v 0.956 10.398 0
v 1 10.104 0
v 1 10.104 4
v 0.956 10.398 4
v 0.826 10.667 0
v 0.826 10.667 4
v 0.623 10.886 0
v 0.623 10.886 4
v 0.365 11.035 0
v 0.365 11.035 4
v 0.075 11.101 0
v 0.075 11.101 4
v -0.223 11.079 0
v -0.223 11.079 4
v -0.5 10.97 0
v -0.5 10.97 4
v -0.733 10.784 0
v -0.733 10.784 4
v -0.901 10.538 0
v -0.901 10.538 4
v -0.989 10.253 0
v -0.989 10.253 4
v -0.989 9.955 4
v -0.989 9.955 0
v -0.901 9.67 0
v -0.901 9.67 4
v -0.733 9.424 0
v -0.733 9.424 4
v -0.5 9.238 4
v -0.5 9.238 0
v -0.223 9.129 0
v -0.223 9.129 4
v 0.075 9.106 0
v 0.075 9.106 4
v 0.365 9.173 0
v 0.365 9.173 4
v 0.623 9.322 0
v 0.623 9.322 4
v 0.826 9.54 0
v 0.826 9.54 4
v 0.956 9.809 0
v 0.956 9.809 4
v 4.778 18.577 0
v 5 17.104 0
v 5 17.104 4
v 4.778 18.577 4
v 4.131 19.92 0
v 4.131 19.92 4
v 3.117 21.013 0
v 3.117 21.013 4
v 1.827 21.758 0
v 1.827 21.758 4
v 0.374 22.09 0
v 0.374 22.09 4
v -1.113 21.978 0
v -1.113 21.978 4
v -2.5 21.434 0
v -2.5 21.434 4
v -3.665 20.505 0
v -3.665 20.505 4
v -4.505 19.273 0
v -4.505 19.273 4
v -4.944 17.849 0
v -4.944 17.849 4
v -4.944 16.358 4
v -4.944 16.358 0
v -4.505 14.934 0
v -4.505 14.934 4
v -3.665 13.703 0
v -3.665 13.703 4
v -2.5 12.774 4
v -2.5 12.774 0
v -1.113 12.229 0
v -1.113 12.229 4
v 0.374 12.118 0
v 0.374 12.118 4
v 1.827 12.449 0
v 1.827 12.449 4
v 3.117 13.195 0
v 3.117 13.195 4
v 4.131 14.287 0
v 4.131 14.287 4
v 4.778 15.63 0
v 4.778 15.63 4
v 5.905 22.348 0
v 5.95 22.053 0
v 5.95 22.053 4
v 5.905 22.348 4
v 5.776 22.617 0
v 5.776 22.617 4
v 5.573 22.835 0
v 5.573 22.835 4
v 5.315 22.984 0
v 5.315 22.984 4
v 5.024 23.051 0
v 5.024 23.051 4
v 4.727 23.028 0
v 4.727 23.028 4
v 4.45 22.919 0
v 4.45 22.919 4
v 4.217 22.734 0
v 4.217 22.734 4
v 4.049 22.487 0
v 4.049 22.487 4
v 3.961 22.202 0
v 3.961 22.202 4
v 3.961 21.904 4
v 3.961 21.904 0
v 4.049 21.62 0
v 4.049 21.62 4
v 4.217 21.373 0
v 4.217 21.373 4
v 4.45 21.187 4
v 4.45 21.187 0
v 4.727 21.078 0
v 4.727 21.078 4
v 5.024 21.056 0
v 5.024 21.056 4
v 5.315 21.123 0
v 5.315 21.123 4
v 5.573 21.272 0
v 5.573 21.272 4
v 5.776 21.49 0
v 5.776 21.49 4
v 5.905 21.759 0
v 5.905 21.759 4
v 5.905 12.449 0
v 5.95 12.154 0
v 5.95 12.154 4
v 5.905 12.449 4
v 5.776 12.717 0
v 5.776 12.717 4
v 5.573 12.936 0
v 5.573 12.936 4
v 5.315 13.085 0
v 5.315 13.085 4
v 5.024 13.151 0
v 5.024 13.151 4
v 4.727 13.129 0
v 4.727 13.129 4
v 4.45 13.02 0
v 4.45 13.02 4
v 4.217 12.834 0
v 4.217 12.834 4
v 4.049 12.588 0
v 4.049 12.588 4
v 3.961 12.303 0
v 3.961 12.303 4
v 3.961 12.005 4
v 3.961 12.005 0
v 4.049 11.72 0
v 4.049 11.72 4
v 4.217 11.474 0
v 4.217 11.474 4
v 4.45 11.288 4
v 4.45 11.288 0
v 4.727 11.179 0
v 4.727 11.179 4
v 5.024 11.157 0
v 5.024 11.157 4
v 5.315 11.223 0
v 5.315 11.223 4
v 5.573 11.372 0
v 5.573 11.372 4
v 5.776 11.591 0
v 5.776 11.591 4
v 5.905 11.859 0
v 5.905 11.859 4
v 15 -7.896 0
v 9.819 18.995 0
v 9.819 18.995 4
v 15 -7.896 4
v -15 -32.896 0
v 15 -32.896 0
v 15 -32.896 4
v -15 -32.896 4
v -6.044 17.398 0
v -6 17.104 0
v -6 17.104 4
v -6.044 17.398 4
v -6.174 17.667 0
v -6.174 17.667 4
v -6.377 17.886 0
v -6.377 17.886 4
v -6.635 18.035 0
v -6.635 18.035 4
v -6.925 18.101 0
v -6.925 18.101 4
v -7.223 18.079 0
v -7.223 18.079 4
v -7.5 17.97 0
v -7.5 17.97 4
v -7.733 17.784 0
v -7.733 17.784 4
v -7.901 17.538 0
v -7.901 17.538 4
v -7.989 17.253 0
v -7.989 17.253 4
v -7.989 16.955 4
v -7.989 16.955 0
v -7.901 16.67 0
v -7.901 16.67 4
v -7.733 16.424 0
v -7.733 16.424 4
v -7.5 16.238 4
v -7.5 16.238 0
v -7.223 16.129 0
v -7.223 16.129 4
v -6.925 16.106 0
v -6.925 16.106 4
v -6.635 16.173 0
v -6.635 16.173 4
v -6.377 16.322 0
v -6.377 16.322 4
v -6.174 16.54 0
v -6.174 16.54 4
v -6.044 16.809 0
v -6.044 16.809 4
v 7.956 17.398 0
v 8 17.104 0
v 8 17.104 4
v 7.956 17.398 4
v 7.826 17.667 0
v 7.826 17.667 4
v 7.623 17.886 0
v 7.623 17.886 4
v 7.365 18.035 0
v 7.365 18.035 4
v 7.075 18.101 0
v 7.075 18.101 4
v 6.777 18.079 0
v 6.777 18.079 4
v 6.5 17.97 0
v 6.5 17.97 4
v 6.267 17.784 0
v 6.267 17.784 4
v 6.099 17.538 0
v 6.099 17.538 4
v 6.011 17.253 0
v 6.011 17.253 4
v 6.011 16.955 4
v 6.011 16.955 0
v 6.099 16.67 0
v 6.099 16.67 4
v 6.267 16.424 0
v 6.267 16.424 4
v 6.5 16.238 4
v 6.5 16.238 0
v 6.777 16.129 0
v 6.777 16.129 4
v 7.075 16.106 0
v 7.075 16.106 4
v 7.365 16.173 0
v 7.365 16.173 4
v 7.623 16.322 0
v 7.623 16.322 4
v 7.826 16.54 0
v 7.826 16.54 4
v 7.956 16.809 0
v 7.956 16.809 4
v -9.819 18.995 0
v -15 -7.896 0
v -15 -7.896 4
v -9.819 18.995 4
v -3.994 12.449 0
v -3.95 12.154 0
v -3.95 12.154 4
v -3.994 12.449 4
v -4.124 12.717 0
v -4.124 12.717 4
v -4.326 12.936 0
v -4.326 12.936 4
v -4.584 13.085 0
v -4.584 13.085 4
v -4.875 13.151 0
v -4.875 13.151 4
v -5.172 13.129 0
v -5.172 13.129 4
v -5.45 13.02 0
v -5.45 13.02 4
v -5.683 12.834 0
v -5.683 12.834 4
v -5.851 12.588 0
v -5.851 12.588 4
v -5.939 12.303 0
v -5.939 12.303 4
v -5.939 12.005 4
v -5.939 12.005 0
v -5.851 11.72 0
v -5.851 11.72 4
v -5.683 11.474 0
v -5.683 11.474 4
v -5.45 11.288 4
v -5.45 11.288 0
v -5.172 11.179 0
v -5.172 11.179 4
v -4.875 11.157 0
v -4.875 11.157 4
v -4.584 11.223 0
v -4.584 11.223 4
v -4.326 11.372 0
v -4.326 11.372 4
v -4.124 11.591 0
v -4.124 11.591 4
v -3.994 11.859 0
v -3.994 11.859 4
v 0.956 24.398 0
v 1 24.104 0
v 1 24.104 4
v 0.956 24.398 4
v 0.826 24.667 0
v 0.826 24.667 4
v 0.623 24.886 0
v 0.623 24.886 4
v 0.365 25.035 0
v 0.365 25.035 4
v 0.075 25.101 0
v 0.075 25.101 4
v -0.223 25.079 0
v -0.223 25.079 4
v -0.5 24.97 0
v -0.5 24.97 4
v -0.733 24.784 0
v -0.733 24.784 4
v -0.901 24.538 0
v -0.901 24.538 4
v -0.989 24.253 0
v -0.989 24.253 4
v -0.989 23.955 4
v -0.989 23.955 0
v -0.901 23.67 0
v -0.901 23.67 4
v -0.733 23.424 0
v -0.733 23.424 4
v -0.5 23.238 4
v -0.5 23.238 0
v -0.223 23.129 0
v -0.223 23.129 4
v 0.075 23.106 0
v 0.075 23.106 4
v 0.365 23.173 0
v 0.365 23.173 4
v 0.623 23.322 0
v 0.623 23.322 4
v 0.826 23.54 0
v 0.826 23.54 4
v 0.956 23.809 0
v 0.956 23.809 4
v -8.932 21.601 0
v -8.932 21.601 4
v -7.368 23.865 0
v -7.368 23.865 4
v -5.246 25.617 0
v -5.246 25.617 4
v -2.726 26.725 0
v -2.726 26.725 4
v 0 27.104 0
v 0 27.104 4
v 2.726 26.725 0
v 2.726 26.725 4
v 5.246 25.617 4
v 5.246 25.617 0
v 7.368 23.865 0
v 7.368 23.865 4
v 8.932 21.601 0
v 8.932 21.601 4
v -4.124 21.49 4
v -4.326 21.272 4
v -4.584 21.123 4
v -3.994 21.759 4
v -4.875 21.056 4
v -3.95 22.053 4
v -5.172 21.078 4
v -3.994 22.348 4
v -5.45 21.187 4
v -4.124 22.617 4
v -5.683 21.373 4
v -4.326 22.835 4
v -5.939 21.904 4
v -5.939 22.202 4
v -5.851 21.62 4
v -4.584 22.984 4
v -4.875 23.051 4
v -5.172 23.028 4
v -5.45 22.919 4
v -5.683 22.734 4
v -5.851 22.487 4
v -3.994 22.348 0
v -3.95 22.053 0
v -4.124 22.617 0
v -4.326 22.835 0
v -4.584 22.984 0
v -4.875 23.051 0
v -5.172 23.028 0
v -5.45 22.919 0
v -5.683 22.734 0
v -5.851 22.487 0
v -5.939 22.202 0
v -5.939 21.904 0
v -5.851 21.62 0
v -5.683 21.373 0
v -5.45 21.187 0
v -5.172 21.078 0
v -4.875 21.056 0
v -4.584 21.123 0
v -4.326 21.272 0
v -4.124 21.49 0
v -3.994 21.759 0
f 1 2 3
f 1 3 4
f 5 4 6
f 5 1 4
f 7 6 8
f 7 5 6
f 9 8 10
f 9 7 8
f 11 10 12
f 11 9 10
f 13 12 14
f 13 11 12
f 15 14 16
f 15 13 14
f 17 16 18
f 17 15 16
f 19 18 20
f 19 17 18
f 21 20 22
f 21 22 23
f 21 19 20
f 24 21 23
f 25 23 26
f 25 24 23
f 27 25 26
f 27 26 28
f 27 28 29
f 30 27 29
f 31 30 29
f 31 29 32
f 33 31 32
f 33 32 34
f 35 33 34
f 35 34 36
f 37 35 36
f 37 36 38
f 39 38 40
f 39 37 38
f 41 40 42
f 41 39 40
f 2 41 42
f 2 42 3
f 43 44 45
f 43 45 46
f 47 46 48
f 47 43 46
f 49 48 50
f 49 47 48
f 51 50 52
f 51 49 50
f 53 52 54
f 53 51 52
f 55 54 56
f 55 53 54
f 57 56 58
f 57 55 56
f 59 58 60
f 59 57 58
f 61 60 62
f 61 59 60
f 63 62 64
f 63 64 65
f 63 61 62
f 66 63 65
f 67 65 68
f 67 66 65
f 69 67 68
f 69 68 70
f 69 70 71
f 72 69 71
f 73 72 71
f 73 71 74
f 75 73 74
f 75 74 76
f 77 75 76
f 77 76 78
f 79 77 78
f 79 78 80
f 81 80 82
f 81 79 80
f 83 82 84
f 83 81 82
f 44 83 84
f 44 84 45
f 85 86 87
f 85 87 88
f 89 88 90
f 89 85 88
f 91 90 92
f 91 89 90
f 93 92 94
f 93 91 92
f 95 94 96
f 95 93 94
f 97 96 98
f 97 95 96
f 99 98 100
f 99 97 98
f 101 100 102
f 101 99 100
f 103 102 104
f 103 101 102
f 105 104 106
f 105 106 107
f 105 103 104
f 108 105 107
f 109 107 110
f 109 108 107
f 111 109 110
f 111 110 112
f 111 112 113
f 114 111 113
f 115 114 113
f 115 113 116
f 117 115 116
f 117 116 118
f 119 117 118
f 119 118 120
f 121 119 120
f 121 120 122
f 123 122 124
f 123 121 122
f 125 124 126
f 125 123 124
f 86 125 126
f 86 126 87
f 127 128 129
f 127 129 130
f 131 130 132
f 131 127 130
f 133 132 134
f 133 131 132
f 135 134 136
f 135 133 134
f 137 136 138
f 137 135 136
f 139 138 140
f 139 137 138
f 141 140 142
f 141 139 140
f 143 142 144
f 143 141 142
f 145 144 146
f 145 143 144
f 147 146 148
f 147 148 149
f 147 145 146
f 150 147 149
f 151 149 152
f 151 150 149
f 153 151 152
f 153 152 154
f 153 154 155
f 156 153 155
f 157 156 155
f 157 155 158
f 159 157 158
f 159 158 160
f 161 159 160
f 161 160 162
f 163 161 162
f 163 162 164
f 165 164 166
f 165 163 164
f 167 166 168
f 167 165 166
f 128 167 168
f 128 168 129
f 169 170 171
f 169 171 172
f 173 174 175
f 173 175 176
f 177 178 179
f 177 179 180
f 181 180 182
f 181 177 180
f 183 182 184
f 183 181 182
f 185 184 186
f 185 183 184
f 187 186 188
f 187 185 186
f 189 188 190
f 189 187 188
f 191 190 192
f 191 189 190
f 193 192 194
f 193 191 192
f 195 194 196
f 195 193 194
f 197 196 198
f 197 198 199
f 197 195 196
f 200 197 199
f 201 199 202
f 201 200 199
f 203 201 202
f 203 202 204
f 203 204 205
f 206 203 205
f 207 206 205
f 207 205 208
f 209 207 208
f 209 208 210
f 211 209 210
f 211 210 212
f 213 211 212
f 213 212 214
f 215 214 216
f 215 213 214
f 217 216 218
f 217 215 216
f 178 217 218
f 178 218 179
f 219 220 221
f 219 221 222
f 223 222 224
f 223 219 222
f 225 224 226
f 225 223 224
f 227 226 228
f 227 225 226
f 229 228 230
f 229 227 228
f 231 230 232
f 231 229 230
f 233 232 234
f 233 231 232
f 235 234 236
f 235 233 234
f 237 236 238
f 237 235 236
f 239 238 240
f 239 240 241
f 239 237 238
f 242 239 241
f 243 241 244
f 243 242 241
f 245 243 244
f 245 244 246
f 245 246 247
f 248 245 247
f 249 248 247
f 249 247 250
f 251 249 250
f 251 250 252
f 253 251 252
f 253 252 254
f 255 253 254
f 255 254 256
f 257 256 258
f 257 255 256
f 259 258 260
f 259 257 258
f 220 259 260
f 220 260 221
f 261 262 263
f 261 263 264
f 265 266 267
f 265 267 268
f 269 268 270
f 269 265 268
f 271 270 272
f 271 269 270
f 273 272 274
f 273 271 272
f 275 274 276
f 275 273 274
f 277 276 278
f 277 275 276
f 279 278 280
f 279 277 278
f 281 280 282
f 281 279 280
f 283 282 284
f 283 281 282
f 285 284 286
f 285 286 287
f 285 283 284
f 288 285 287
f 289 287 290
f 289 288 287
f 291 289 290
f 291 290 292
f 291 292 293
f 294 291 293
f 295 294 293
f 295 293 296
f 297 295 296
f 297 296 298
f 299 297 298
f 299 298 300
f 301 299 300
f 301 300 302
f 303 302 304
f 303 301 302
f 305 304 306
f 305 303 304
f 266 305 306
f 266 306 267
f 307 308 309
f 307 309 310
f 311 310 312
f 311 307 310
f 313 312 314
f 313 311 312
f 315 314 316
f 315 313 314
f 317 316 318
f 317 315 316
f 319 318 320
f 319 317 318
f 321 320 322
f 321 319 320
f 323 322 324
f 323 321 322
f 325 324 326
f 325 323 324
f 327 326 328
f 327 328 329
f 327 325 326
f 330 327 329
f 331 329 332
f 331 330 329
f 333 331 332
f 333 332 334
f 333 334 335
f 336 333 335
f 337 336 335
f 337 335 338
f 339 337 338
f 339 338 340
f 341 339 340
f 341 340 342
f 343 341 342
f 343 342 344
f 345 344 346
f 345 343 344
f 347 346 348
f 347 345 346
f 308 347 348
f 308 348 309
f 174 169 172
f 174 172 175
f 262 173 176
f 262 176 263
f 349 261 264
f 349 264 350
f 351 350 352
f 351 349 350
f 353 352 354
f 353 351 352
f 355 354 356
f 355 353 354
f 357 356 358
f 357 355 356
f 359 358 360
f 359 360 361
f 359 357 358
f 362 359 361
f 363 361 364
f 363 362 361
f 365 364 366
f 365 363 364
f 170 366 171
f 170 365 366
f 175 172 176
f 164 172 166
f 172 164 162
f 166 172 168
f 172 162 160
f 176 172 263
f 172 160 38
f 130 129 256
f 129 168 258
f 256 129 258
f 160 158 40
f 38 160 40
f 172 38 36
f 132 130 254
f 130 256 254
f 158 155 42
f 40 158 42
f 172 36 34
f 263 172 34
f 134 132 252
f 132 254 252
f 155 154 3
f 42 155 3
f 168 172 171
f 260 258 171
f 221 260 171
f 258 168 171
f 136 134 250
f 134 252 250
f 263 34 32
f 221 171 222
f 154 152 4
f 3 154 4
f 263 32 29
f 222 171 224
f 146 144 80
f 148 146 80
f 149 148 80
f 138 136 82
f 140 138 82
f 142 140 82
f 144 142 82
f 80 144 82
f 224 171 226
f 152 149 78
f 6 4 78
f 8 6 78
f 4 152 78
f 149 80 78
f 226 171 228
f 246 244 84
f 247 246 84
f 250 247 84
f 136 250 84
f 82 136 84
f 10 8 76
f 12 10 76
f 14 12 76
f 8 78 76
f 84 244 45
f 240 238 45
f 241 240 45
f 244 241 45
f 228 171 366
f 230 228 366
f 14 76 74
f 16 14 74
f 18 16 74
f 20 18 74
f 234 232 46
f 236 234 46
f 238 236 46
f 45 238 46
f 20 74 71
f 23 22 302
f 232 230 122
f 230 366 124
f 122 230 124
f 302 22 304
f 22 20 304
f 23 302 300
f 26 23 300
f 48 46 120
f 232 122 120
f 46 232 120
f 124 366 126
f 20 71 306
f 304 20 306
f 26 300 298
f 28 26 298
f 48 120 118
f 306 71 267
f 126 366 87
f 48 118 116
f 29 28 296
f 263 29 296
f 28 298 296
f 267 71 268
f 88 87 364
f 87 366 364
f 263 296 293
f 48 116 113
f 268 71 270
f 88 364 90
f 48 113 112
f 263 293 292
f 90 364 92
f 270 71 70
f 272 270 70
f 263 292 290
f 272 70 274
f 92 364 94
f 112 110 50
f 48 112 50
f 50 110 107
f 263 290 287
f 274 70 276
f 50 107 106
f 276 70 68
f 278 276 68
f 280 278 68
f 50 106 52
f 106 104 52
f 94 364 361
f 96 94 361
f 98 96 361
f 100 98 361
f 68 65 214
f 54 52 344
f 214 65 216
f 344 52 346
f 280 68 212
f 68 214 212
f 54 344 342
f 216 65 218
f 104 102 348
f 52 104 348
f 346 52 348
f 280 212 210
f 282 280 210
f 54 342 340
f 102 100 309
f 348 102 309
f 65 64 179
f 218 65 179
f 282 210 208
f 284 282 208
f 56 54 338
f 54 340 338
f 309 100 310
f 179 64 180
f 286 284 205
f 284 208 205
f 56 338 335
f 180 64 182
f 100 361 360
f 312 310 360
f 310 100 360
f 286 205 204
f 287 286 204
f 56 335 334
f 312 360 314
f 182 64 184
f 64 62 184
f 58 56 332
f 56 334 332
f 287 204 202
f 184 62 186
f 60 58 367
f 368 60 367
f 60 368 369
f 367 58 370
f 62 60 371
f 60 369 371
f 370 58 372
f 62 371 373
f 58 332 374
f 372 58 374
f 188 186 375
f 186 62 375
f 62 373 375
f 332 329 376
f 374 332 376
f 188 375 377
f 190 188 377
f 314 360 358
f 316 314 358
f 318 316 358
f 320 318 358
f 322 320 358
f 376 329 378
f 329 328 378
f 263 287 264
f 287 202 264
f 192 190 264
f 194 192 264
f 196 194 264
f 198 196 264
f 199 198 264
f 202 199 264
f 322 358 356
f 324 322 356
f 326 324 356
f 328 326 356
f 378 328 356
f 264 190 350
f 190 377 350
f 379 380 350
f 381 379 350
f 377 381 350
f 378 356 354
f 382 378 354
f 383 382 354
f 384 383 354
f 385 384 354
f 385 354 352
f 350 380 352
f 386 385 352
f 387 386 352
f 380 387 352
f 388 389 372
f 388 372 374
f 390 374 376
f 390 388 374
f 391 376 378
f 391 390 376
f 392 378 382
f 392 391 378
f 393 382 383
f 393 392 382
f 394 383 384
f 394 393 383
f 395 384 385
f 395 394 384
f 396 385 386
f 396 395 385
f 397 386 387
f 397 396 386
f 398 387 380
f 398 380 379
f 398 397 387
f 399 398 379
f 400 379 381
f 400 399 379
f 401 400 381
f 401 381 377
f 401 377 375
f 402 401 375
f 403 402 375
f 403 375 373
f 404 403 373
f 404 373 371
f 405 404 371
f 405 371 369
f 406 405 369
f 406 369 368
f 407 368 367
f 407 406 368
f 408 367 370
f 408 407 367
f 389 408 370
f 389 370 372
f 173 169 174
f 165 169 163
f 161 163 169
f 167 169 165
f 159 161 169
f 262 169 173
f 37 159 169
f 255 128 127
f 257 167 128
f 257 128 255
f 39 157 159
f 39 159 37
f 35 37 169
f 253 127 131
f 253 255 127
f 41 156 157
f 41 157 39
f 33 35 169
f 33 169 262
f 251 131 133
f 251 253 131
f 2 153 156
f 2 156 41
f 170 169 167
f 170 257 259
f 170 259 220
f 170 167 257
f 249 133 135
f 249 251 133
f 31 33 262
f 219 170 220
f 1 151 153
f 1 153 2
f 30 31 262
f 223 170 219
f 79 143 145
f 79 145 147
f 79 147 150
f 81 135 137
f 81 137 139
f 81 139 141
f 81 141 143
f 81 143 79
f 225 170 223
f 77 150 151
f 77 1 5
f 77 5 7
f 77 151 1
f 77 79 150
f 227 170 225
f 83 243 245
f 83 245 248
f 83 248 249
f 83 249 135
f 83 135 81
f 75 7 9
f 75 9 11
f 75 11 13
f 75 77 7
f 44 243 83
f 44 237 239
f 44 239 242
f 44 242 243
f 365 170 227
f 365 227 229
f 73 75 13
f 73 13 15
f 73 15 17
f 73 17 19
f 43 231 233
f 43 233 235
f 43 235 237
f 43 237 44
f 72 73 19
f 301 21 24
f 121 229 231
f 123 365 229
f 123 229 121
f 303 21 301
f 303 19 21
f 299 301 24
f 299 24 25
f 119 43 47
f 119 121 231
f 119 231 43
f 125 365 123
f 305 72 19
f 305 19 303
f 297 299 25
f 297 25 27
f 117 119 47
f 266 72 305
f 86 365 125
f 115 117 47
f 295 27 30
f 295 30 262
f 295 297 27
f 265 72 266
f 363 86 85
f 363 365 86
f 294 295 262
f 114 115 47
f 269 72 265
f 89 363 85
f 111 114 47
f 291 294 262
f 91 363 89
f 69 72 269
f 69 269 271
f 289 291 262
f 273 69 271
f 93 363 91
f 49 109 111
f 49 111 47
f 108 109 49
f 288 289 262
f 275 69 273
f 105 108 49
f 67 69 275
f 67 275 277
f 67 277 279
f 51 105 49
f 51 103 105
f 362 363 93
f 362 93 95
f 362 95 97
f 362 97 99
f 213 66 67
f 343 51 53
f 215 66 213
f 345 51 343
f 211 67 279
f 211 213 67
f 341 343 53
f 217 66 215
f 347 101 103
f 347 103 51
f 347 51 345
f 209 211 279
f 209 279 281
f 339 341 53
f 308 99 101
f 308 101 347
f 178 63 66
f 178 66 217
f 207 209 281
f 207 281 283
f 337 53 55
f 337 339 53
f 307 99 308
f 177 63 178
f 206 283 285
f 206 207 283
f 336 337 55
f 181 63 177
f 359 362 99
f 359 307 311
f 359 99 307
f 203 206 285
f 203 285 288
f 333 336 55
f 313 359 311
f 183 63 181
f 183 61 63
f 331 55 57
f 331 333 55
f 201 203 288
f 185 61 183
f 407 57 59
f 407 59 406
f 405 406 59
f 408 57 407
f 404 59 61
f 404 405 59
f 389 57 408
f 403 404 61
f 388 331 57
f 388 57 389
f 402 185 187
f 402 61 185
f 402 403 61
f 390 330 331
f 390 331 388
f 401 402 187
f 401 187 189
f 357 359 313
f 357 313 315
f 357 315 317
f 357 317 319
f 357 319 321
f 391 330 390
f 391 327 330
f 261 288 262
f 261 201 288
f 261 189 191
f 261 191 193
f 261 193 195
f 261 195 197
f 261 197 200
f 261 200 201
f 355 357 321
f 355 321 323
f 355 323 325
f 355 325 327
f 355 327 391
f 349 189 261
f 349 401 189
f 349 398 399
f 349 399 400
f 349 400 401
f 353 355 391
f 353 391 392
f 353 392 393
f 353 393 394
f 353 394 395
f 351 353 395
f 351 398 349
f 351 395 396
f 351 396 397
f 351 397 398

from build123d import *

# Parameters (mm, degrees)
SKETCH1_R           = 1
SKETCH1_R_2         = 5
BOSS_EXTRUDE1_DEPTH = 4


with BuildPart() as part:
    # Sketch1 → Boss-Extrude1 (new body)
    with BuildSketch(Plane.XY):
        with BuildLine():
            Line((-15, -7.896321871), (-9.819449375, 18.995347754))
            ThreePointArc((-9.819449375, 18.995347754), (0, 27.103678129), (9.819449375, 18.995347754))
            Line((9.819449375, 18.995347754), (15, -7.896321871))
            Line((15, -7.896321871), (15, -32.896321871))
            Line((15, -32.896321871), (-15, -32.896321871))
            Line((-15, -32.896321871), (-15, -7.896321871))
        make_face()
        with Locations((0, 24.103678129)):
            Circle(SKETCH1_R, mode=Mode.SUBTRACT)
        with Locations((4.949747468, 22.053425597)):
            Circle(SKETCH1_R, mode=Mode.SUBTRACT)
        with Locations((7, 17.103678129)):
            Circle(SKETCH1_R, mode=Mode.SUBTRACT)
        with Locations((4.949747468, 12.153930661)):
            Circle(SKETCH1_R, mode=Mode.SUBTRACT)
        with Locations((0, 10.103678129)):
            Circle(SKETCH1_R, mode=Mode.SUBTRACT)
        with Locations((-4.949747468, 12.153930661)):
            Circle(SKETCH1_R, mode=Mode.SUBTRACT)
        with Locations((-7, 17.103678129)):
            Circle(SKETCH1_R, mode=Mode.SUBTRACT)
        with Locations((-4.949747468, 22.053425597)):
            Circle(SKETCH1_R, mode=Mode.SUBTRACT)
        with Locations((0, 17.103678129)):
            Circle(SKETCH1_R_2, mode=Mode.SUBTRACT)
    extrude(amount=BOSS_EXTRUDE1_DEPTH)


solid = part.part
